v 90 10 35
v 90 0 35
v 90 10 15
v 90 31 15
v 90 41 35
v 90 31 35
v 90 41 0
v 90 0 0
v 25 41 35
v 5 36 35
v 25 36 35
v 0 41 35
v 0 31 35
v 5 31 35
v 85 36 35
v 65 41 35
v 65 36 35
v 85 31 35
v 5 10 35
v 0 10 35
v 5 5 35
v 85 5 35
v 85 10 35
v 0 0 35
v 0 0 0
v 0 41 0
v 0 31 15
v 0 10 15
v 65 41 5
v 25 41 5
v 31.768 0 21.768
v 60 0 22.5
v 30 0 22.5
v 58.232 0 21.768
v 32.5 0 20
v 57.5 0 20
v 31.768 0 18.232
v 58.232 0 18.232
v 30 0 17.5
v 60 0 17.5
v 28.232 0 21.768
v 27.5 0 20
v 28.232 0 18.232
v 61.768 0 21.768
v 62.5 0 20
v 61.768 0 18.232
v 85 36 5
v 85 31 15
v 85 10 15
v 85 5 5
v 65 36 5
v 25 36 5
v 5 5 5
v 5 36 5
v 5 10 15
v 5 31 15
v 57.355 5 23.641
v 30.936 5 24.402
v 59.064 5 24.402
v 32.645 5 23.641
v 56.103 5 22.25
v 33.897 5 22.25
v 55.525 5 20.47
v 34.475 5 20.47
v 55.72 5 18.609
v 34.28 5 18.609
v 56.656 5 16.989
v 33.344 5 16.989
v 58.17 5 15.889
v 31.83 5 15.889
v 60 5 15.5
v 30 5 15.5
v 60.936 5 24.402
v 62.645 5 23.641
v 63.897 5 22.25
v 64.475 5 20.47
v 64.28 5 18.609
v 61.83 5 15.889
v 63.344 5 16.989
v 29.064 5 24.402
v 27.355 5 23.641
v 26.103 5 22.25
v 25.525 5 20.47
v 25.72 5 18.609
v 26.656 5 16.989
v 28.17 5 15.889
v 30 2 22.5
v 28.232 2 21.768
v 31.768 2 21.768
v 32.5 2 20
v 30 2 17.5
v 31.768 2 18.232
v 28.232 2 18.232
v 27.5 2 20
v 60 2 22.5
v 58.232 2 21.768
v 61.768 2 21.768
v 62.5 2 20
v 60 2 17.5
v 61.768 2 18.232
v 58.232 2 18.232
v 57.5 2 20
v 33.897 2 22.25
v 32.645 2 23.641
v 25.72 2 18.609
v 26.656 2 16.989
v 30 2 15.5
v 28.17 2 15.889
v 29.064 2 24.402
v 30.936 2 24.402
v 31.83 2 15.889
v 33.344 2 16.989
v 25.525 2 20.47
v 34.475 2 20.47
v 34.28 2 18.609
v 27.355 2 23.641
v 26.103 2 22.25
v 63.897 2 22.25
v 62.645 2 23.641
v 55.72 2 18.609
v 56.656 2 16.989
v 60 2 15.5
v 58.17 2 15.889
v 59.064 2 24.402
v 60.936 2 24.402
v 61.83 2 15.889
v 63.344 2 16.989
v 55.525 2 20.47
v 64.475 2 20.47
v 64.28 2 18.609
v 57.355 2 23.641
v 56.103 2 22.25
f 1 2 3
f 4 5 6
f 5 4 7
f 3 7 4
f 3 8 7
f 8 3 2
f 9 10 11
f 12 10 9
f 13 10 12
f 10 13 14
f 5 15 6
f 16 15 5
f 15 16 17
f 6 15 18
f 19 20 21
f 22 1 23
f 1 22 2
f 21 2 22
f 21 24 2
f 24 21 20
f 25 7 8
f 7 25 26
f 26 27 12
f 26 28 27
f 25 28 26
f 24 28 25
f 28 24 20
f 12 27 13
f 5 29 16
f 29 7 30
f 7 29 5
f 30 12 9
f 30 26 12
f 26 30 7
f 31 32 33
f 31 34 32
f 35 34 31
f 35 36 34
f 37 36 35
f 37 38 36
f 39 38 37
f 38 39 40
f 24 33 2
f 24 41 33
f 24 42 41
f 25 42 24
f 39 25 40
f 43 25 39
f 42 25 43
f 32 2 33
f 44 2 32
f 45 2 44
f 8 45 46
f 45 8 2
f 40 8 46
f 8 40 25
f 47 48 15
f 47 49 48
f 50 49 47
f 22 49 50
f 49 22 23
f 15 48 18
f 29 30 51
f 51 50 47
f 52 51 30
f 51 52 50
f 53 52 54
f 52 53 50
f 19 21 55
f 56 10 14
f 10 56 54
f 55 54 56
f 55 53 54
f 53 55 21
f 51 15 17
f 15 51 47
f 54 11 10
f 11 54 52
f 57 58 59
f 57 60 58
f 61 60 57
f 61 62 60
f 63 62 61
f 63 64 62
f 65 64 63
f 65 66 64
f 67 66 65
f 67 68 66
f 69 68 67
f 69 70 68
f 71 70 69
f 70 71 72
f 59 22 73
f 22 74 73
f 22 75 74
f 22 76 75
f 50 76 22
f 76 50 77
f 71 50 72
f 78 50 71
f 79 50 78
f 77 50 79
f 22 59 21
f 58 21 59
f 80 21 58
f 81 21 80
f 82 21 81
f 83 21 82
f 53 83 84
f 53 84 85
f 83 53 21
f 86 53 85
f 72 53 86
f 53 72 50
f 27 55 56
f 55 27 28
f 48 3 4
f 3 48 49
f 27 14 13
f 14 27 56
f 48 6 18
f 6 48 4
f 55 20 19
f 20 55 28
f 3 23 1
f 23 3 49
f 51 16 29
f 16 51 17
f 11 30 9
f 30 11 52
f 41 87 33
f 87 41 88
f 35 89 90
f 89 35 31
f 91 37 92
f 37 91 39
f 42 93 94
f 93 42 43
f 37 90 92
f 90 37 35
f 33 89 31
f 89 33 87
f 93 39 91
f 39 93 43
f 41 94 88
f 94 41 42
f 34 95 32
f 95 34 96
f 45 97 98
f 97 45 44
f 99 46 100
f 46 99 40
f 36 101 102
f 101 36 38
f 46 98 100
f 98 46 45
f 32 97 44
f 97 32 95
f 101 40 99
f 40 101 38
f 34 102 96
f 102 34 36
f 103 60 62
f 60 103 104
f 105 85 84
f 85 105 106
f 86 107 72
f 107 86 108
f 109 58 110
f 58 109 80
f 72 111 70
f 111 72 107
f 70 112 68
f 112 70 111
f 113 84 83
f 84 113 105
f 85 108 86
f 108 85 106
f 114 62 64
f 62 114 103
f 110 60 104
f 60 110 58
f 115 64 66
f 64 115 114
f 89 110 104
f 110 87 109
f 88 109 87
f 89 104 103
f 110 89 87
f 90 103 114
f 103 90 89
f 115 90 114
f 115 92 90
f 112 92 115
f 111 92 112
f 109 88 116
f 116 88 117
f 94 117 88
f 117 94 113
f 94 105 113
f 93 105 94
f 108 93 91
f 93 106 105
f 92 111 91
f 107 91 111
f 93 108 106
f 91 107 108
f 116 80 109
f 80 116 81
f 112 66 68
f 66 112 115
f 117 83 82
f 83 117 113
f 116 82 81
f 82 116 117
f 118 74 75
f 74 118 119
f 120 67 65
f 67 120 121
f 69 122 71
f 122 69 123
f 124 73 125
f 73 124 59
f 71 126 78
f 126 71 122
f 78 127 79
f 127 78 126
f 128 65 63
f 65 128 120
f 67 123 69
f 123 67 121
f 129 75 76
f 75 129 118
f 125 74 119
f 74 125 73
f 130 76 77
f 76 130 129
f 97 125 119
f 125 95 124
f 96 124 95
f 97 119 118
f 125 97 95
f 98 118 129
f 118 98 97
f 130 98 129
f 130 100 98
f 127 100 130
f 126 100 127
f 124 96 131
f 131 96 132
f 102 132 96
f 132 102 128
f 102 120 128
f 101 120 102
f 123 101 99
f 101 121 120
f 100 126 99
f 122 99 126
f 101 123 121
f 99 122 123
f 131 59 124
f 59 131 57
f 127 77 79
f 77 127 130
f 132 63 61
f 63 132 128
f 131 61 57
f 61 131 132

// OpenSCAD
difference()
{
    cube([90,41,35]);
    translate([5,5,5]) cube([80,31,35]);
    translate([-5,10,15]) cube([99,21,35]);
    translate([25,5,5]) cube([40,50,35]);
    translate([30,10,20]) rotate([90,90,0]) cylinder(h=15,d=5);
    translate([60,10,20]) rotate([90,90,0]) cylinder(h=15,d=5);
    translate([30,6,20]) rotate([90,90,0]) cylinder(h=4,d=9);
    translate([60,6,20]) rotate([90,90,0]) cylinder(h=4,d=9);    
}
